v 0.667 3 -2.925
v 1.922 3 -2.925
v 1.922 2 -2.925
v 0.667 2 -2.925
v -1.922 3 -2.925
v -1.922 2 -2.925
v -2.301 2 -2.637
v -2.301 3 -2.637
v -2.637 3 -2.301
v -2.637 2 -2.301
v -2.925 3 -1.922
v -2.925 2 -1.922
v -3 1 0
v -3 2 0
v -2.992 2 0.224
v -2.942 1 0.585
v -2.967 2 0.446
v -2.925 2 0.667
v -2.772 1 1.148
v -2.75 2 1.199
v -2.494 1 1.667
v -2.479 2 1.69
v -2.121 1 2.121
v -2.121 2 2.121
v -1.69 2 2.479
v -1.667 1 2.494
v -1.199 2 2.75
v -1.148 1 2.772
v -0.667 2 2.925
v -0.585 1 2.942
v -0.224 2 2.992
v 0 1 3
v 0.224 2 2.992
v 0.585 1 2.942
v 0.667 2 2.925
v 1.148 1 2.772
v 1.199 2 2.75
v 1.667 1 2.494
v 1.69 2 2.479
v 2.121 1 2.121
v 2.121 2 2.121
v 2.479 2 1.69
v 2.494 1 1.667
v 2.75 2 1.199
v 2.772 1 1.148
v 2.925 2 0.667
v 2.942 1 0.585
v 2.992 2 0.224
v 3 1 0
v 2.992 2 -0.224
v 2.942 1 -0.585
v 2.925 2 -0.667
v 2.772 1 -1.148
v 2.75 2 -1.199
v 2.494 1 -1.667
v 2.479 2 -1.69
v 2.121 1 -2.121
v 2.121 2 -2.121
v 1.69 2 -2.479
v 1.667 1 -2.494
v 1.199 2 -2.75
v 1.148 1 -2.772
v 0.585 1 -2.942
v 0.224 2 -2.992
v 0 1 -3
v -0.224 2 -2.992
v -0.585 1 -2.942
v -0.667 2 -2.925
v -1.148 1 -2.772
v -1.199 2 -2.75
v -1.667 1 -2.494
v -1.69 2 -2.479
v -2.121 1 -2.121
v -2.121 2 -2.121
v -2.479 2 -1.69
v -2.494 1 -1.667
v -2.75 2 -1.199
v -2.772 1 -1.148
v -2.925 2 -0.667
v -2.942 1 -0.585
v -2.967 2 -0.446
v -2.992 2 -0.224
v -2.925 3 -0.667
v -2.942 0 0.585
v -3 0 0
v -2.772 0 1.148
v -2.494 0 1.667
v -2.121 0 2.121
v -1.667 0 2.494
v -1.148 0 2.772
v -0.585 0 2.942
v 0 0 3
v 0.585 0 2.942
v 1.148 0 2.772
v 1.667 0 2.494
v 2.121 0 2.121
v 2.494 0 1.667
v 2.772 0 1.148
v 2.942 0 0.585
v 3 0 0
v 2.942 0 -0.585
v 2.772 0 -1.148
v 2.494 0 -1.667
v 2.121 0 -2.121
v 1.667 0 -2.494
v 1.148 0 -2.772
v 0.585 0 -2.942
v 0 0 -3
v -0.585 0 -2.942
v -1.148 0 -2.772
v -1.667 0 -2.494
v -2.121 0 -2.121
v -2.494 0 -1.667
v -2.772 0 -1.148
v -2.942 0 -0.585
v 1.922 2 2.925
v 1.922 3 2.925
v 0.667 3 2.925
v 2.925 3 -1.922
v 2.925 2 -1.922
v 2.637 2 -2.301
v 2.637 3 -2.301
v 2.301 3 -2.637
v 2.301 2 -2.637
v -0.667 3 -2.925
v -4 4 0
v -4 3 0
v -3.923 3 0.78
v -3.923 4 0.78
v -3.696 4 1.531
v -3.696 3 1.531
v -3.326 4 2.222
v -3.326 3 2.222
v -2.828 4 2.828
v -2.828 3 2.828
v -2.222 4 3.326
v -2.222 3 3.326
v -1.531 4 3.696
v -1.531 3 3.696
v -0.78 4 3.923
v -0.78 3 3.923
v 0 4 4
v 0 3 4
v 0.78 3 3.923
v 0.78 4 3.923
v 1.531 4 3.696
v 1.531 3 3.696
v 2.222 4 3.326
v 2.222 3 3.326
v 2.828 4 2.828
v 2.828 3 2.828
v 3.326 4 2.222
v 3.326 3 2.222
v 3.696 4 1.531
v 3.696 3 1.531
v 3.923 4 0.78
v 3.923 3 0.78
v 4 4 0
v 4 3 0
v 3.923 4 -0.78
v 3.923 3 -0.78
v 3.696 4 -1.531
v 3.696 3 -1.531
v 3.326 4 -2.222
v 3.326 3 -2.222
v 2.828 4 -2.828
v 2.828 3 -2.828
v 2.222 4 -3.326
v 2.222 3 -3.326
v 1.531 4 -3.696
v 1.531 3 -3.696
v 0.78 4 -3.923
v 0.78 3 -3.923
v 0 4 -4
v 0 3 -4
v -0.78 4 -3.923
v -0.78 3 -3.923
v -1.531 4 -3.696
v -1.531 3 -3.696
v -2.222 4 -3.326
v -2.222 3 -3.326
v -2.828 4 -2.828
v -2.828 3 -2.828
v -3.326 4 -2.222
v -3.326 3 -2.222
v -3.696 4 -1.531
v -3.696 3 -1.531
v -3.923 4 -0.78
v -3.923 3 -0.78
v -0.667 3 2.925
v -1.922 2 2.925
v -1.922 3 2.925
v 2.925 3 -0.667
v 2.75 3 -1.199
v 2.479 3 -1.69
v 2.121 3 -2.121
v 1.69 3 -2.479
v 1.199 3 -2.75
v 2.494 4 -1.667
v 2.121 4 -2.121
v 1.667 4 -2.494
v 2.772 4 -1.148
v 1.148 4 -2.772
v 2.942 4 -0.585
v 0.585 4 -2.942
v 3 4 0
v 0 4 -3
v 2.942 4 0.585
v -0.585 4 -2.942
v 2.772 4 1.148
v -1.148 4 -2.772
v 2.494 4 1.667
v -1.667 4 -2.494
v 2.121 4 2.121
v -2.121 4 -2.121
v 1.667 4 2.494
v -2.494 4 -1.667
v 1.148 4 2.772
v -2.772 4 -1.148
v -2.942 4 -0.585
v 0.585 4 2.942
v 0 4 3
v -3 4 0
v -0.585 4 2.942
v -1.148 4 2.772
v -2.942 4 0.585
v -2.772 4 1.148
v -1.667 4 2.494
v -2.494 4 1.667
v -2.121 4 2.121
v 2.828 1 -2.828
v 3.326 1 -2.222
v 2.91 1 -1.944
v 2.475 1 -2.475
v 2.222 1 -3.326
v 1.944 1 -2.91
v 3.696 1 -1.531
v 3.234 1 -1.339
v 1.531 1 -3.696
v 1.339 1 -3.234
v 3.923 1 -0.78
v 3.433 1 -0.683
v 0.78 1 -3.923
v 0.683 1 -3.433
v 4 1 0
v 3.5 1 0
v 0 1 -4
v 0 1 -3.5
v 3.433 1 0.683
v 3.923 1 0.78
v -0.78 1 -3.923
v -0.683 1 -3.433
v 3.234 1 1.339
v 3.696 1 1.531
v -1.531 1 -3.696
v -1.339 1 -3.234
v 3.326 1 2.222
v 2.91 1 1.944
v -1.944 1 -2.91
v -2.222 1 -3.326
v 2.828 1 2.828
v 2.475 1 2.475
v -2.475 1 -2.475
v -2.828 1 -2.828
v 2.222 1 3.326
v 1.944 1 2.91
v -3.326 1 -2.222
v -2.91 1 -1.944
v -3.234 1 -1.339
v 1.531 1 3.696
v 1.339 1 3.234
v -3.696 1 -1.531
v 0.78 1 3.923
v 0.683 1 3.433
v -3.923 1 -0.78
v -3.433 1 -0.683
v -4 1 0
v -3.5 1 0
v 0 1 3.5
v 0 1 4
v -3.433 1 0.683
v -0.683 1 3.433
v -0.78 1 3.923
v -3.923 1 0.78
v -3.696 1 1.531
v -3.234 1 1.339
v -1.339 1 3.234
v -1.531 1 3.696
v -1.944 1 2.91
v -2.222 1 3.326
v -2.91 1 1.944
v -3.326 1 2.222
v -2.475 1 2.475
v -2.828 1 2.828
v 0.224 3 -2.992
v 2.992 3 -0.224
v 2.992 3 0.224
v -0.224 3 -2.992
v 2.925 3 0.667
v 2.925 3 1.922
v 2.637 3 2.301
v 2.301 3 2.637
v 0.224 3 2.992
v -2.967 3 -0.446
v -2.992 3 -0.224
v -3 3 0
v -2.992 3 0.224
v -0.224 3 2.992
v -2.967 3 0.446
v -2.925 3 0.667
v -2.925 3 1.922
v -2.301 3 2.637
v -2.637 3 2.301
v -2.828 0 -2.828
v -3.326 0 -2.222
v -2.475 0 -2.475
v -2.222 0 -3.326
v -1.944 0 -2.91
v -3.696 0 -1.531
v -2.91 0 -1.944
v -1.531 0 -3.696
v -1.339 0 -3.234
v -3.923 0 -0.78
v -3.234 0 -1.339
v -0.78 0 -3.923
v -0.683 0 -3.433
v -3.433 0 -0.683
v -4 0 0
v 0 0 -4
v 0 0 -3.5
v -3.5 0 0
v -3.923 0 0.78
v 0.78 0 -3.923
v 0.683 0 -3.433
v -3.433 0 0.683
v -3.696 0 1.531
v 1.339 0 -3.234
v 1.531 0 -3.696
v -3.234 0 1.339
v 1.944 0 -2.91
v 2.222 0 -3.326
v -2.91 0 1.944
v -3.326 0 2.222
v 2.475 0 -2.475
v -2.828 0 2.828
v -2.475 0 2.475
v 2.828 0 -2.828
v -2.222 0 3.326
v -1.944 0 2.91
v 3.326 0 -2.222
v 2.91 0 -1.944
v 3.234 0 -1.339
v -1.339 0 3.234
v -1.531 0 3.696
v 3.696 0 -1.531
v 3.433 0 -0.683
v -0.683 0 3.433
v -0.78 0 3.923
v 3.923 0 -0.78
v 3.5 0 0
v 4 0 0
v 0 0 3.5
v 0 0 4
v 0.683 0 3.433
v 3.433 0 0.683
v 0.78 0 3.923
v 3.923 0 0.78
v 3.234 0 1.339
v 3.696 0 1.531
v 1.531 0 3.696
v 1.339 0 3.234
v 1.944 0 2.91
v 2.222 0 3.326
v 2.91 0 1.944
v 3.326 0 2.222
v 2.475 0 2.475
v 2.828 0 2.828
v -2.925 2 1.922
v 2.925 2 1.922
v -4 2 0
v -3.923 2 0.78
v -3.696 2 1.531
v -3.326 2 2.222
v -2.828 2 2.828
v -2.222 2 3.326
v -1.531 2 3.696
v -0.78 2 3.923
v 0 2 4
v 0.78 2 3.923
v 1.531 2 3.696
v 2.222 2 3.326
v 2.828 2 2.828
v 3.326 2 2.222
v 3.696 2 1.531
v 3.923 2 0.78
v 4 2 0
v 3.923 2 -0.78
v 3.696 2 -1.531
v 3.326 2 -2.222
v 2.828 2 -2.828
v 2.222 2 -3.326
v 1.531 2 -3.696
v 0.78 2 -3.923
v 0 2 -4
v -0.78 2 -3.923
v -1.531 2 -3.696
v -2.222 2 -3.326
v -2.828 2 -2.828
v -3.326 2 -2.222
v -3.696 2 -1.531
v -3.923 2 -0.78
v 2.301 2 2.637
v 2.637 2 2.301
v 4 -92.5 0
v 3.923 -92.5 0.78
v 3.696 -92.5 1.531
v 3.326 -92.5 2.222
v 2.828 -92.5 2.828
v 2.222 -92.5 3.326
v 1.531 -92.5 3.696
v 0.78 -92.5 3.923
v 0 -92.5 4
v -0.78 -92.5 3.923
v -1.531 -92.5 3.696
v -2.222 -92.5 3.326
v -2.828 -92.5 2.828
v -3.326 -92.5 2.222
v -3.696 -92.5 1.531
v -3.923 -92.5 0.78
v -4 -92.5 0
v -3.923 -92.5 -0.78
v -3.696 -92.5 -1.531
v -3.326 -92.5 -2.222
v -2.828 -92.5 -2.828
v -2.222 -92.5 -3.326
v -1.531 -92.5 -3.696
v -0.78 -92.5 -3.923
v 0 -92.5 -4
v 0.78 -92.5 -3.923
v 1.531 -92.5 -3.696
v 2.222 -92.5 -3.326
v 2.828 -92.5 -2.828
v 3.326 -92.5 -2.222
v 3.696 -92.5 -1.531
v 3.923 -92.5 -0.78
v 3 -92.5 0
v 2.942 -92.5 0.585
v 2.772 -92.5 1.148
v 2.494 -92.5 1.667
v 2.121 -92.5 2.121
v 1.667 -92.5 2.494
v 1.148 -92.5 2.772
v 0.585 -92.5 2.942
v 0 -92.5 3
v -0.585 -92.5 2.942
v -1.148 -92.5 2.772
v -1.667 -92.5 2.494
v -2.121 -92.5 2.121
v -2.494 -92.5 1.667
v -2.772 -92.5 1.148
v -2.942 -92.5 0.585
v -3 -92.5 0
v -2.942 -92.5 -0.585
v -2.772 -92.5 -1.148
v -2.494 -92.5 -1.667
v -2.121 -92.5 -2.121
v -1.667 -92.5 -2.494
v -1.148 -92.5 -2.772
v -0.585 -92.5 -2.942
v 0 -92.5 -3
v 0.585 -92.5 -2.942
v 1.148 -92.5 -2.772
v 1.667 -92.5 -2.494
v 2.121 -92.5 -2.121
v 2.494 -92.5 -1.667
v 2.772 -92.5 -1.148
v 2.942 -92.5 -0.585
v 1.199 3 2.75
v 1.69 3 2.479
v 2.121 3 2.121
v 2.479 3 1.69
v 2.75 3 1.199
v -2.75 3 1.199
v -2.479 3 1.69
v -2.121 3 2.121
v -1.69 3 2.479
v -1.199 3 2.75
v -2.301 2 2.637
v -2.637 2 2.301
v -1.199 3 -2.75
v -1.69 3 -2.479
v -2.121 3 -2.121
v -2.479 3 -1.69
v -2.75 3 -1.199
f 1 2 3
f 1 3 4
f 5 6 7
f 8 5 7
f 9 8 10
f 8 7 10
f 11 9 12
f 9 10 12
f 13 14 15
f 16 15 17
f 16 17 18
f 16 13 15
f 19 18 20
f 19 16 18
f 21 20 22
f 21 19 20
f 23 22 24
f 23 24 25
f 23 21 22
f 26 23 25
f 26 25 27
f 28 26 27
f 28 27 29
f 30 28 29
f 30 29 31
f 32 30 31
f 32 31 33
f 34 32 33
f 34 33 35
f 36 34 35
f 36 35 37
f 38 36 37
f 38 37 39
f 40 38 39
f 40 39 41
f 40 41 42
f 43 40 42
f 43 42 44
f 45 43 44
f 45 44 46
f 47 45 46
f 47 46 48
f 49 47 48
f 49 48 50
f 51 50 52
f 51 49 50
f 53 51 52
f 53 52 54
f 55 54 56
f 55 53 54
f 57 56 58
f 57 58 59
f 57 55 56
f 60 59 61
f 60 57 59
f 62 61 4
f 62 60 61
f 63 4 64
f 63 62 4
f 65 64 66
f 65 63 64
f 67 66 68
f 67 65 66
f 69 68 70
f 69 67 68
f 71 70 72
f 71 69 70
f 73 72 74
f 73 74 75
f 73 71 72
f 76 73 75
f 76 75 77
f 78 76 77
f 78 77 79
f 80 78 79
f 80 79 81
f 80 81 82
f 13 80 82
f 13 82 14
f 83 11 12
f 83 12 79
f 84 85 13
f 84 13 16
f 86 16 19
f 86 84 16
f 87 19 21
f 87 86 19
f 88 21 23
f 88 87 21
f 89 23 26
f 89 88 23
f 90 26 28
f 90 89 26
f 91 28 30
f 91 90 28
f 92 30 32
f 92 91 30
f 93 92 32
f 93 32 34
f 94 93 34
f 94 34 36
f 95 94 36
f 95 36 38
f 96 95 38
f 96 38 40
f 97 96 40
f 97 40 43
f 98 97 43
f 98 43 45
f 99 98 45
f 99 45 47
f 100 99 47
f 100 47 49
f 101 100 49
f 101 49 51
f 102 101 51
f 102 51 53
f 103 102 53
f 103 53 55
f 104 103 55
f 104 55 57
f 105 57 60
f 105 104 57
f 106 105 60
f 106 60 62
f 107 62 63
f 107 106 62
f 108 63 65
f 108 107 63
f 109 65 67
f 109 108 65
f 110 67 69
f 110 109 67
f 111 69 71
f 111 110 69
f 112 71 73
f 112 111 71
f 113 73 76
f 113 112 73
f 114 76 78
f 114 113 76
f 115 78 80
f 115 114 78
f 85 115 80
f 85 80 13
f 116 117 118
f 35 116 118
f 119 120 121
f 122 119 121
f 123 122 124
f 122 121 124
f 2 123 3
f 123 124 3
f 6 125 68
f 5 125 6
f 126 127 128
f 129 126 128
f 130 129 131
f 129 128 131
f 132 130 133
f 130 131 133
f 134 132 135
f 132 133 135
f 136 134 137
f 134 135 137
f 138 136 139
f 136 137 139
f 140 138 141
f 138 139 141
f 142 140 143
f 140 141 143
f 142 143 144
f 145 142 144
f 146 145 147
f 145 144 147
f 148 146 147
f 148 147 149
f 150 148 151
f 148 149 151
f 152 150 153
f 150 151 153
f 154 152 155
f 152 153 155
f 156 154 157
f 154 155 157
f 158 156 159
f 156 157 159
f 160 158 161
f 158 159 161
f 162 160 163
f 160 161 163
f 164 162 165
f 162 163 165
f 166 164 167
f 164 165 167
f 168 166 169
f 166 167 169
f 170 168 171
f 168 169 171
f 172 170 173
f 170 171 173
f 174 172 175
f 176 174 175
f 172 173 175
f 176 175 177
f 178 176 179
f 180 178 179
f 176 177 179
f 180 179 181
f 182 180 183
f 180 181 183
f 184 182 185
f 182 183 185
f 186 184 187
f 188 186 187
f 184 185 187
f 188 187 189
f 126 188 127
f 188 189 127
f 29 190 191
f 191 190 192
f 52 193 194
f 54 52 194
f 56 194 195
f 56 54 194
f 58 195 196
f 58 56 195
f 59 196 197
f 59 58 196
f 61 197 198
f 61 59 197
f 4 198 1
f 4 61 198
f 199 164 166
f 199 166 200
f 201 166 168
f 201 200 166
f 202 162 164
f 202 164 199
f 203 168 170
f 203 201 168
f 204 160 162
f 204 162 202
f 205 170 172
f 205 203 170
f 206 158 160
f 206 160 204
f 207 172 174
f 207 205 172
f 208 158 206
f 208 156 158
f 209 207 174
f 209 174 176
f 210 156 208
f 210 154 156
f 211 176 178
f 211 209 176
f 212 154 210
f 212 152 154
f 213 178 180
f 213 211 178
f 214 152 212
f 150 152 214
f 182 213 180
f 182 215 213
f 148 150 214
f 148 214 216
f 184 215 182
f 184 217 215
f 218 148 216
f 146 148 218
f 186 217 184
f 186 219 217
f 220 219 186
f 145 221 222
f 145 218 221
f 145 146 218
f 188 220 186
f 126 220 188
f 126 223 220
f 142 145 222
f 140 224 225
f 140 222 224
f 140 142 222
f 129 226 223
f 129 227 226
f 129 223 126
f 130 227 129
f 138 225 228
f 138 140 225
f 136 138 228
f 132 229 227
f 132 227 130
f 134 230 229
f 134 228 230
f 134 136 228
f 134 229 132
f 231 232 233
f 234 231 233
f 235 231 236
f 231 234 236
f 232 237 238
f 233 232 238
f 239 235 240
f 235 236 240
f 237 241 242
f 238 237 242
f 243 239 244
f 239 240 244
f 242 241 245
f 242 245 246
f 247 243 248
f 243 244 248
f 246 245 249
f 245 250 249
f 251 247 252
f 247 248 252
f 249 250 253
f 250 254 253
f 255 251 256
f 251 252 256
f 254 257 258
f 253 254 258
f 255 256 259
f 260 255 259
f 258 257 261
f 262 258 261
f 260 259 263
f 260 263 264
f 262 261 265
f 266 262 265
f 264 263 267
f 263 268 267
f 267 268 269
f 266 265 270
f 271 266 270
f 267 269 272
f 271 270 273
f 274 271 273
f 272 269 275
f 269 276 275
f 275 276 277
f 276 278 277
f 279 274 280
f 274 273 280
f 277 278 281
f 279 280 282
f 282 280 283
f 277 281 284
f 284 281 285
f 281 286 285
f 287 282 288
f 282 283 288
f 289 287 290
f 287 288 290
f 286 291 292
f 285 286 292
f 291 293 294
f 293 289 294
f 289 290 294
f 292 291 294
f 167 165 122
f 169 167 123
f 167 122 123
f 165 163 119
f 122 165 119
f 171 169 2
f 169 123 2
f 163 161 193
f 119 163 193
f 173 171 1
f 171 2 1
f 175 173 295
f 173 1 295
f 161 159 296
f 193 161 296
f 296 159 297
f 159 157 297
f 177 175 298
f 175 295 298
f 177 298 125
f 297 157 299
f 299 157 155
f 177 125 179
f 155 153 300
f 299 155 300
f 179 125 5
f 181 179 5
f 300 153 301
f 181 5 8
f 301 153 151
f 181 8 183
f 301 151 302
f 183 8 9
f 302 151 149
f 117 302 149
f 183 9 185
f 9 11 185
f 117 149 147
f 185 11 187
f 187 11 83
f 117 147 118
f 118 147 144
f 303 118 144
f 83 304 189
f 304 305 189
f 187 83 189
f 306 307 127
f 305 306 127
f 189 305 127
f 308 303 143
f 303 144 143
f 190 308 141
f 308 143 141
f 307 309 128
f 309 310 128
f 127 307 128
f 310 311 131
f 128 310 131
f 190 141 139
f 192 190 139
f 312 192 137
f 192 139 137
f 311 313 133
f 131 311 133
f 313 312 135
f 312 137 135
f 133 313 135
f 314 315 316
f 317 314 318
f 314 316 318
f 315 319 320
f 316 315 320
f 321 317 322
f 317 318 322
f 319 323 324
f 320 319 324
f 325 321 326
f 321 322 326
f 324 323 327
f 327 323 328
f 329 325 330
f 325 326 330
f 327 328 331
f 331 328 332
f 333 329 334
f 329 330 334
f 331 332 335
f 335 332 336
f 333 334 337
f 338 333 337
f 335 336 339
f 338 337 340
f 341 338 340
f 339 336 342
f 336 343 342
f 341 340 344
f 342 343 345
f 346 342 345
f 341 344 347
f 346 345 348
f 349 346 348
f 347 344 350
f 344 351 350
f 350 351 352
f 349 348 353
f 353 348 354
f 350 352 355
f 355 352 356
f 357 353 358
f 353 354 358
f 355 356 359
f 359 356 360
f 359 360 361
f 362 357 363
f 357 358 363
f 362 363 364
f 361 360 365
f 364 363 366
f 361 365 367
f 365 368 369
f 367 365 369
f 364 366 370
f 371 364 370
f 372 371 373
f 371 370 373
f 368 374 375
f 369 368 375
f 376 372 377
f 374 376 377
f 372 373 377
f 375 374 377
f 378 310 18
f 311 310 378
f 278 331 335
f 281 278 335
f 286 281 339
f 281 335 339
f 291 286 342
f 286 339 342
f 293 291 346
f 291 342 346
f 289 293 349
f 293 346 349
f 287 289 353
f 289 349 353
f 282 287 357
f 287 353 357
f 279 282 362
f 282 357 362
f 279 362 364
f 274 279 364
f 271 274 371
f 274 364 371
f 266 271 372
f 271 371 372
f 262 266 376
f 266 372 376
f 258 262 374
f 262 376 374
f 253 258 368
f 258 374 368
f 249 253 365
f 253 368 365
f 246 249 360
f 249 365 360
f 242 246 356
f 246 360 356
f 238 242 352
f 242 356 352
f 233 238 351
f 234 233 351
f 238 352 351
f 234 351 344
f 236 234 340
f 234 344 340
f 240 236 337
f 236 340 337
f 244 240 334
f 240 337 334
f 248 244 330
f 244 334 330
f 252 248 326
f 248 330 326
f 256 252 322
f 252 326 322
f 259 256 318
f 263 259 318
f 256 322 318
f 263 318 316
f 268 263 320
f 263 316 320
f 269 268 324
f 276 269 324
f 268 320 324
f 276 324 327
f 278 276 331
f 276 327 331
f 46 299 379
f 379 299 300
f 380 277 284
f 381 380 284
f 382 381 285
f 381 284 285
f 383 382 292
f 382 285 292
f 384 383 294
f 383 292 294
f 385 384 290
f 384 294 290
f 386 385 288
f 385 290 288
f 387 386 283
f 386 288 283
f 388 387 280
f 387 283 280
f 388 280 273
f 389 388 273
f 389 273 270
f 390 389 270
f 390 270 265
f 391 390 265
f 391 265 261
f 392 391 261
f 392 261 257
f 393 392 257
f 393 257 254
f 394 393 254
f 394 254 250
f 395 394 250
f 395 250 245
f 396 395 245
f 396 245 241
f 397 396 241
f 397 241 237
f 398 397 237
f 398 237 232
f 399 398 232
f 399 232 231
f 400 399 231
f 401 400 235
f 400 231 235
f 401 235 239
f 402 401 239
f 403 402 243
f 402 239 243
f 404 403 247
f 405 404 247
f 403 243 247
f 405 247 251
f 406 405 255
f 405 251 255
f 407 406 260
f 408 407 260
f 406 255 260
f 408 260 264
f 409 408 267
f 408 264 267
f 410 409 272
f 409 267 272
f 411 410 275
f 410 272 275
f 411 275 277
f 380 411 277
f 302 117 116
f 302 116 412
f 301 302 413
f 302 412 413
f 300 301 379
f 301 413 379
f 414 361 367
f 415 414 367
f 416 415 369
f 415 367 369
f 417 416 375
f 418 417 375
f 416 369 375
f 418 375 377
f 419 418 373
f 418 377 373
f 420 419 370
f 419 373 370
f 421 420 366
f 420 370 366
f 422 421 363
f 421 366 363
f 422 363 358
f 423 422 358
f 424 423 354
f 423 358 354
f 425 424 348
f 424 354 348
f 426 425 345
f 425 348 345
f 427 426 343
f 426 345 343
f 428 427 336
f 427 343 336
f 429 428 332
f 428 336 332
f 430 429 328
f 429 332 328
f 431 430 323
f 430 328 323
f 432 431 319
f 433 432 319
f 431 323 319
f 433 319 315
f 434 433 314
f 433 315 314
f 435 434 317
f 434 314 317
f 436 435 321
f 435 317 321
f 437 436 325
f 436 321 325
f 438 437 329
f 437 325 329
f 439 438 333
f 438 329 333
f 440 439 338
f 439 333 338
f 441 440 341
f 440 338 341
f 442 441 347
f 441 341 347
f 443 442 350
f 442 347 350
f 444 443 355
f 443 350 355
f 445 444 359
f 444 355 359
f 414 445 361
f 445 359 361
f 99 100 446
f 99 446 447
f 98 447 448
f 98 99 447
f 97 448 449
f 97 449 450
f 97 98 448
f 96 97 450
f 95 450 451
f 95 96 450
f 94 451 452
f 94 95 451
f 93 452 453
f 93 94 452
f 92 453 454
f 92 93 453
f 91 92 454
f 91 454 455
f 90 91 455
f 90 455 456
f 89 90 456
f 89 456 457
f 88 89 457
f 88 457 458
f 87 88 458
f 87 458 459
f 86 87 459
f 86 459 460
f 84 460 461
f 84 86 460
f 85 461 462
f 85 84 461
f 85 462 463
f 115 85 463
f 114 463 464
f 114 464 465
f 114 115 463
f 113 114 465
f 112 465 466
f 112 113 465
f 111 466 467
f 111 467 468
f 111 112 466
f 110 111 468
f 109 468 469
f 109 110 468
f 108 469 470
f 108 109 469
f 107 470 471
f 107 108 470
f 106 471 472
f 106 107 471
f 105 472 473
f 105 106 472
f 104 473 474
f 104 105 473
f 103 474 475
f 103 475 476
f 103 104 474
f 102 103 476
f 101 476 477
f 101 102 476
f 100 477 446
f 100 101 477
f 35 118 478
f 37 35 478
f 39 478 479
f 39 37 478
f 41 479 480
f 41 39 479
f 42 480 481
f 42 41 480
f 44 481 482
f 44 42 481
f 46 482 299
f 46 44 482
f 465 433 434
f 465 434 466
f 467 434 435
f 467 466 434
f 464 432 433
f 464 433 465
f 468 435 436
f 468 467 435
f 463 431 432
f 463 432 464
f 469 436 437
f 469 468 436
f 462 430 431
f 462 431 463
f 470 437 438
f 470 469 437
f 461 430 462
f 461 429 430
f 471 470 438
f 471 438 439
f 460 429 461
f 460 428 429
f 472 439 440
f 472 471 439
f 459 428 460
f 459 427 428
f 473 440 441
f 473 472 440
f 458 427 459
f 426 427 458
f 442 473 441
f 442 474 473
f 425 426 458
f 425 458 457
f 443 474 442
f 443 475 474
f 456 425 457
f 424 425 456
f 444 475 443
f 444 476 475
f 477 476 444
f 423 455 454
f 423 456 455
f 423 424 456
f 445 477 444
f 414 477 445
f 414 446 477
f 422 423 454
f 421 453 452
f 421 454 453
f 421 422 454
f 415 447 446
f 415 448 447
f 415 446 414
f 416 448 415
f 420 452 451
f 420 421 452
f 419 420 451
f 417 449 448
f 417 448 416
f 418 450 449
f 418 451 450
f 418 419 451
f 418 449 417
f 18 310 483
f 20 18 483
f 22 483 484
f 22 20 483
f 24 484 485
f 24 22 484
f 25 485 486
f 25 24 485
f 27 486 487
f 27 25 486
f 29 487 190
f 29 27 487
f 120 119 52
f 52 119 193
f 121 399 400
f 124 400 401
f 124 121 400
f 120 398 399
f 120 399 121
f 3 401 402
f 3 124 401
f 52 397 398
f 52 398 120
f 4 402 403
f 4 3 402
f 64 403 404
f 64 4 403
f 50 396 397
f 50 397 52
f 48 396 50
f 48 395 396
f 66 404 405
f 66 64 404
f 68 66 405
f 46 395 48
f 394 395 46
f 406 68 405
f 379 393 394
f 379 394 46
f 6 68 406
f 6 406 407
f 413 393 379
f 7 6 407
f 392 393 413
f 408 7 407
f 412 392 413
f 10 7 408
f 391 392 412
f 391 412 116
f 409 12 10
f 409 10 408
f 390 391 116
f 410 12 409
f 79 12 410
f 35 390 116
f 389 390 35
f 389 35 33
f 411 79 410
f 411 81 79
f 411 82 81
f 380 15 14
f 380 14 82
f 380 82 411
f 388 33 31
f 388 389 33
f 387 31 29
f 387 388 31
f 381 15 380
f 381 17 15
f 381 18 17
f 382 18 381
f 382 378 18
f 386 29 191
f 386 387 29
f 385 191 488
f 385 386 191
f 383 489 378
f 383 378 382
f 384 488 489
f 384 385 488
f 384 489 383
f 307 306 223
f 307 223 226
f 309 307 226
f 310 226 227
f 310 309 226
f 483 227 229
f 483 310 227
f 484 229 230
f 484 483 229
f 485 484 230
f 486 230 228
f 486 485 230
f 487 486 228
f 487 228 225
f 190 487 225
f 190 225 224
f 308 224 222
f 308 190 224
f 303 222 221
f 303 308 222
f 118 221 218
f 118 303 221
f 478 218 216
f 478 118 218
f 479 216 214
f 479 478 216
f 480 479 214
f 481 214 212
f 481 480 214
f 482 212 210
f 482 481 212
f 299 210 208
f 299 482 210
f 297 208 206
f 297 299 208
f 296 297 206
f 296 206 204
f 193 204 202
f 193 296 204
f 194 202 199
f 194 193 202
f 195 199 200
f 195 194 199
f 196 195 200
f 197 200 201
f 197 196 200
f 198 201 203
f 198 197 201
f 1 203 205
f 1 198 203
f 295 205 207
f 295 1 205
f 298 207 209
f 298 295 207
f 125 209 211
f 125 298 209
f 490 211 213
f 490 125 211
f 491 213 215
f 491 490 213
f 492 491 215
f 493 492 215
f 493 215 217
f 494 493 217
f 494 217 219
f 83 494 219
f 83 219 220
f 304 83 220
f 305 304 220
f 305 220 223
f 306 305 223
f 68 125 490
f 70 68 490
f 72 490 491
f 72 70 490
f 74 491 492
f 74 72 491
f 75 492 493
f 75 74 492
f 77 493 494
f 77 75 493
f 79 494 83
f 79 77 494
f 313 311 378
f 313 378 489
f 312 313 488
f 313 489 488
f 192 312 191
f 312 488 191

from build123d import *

# Parameters (mm, degrees)
F0_R      = 4
F0_R_2    = 3
F1_DEPTH  = 92.5
F2_R      = 3.5
F2_R_2    = 3
F3_DEPTH  = 1
F4_R      = 4
F4_R_2    = 3
F5_DEPTH  = 1
F6_R      = 3.5
F6_R_2    = 3
F7_DEPTH  = 1
F8_W      = 10.2374576963
F8_H      = 9.6328482032
F8_W_2    = 5.85
F8_H_2    = 5.85
F9_DEPTH  = 1
F10_R     = 4
F10_R_2   = 3
F11_DEPTH = 1


with BuildPart() as f1:
    # F0 (on Front) → F1 (new body)
    with BuildSketch(Plane.XZ):
        Circle(F0_R)
        Circle(F0_R_2, mode=Mode.SUBTRACT)
    extrude(amount=F1_DEPTH)

    # F2 (on face) → F3 (join)
    with BuildSketch(Plane(origin=(0, 0, 0), x_dir=(-1, 0, 0), z_dir=(0, 1, 0))):
        Circle(F2_R)
        Circle(F2_R_2, mode=Mode.SUBTRACT)
    extrude(amount=F3_DEPTH)

    # F4 (on face) → F5 (join)
    with BuildSketch(Plane(origin=(0, 1, 0), x_dir=(-1, 0, 0), z_dir=(0, 1, 0))):
        Circle(F4_R)
        Circle(F4_R_2, mode=Mode.SUBTRACT)
    extrude(amount=F5_DEPTH)

    # F6 (on face) → F7 (join)
    with BuildSketch(Plane(origin=(0, 2, 0), x_dir=(-1, 0, 0), z_dir=(0, 1, 0))):
        Circle(F6_R)
        Circle(F6_R_2, mode=Mode.SUBTRACT)
    extrude(amount=F7_DEPTH)

    # F8 (on face) → F9 (cut)
    with BuildSketch(Plane(origin=(0, 3, 0), x_dir=(-1, 0, 0), z_dir=(0, 1, 0))):
        with Locations((0.2122113947, -0.0024125911)):
            Rectangle(F8_W, F8_H)
        Rectangle(F8_W_2, F8_H_2, mode=Mode.SUBTRACT)
    extrude(amount=-F9_DEPTH, mode=Mode.SUBTRACT)

    # F10 (on face) → F11 (join)
    with BuildSketch(Plane(origin=(0, 3, 0), x_dir=(-1, 0, 0), z_dir=(0, 1, 0))):
        Circle(F10_R)
        Circle(F10_R_2, mode=Mode.SUBTRACT)
    extrude(amount=F11_DEPTH)


solid = f1.part
